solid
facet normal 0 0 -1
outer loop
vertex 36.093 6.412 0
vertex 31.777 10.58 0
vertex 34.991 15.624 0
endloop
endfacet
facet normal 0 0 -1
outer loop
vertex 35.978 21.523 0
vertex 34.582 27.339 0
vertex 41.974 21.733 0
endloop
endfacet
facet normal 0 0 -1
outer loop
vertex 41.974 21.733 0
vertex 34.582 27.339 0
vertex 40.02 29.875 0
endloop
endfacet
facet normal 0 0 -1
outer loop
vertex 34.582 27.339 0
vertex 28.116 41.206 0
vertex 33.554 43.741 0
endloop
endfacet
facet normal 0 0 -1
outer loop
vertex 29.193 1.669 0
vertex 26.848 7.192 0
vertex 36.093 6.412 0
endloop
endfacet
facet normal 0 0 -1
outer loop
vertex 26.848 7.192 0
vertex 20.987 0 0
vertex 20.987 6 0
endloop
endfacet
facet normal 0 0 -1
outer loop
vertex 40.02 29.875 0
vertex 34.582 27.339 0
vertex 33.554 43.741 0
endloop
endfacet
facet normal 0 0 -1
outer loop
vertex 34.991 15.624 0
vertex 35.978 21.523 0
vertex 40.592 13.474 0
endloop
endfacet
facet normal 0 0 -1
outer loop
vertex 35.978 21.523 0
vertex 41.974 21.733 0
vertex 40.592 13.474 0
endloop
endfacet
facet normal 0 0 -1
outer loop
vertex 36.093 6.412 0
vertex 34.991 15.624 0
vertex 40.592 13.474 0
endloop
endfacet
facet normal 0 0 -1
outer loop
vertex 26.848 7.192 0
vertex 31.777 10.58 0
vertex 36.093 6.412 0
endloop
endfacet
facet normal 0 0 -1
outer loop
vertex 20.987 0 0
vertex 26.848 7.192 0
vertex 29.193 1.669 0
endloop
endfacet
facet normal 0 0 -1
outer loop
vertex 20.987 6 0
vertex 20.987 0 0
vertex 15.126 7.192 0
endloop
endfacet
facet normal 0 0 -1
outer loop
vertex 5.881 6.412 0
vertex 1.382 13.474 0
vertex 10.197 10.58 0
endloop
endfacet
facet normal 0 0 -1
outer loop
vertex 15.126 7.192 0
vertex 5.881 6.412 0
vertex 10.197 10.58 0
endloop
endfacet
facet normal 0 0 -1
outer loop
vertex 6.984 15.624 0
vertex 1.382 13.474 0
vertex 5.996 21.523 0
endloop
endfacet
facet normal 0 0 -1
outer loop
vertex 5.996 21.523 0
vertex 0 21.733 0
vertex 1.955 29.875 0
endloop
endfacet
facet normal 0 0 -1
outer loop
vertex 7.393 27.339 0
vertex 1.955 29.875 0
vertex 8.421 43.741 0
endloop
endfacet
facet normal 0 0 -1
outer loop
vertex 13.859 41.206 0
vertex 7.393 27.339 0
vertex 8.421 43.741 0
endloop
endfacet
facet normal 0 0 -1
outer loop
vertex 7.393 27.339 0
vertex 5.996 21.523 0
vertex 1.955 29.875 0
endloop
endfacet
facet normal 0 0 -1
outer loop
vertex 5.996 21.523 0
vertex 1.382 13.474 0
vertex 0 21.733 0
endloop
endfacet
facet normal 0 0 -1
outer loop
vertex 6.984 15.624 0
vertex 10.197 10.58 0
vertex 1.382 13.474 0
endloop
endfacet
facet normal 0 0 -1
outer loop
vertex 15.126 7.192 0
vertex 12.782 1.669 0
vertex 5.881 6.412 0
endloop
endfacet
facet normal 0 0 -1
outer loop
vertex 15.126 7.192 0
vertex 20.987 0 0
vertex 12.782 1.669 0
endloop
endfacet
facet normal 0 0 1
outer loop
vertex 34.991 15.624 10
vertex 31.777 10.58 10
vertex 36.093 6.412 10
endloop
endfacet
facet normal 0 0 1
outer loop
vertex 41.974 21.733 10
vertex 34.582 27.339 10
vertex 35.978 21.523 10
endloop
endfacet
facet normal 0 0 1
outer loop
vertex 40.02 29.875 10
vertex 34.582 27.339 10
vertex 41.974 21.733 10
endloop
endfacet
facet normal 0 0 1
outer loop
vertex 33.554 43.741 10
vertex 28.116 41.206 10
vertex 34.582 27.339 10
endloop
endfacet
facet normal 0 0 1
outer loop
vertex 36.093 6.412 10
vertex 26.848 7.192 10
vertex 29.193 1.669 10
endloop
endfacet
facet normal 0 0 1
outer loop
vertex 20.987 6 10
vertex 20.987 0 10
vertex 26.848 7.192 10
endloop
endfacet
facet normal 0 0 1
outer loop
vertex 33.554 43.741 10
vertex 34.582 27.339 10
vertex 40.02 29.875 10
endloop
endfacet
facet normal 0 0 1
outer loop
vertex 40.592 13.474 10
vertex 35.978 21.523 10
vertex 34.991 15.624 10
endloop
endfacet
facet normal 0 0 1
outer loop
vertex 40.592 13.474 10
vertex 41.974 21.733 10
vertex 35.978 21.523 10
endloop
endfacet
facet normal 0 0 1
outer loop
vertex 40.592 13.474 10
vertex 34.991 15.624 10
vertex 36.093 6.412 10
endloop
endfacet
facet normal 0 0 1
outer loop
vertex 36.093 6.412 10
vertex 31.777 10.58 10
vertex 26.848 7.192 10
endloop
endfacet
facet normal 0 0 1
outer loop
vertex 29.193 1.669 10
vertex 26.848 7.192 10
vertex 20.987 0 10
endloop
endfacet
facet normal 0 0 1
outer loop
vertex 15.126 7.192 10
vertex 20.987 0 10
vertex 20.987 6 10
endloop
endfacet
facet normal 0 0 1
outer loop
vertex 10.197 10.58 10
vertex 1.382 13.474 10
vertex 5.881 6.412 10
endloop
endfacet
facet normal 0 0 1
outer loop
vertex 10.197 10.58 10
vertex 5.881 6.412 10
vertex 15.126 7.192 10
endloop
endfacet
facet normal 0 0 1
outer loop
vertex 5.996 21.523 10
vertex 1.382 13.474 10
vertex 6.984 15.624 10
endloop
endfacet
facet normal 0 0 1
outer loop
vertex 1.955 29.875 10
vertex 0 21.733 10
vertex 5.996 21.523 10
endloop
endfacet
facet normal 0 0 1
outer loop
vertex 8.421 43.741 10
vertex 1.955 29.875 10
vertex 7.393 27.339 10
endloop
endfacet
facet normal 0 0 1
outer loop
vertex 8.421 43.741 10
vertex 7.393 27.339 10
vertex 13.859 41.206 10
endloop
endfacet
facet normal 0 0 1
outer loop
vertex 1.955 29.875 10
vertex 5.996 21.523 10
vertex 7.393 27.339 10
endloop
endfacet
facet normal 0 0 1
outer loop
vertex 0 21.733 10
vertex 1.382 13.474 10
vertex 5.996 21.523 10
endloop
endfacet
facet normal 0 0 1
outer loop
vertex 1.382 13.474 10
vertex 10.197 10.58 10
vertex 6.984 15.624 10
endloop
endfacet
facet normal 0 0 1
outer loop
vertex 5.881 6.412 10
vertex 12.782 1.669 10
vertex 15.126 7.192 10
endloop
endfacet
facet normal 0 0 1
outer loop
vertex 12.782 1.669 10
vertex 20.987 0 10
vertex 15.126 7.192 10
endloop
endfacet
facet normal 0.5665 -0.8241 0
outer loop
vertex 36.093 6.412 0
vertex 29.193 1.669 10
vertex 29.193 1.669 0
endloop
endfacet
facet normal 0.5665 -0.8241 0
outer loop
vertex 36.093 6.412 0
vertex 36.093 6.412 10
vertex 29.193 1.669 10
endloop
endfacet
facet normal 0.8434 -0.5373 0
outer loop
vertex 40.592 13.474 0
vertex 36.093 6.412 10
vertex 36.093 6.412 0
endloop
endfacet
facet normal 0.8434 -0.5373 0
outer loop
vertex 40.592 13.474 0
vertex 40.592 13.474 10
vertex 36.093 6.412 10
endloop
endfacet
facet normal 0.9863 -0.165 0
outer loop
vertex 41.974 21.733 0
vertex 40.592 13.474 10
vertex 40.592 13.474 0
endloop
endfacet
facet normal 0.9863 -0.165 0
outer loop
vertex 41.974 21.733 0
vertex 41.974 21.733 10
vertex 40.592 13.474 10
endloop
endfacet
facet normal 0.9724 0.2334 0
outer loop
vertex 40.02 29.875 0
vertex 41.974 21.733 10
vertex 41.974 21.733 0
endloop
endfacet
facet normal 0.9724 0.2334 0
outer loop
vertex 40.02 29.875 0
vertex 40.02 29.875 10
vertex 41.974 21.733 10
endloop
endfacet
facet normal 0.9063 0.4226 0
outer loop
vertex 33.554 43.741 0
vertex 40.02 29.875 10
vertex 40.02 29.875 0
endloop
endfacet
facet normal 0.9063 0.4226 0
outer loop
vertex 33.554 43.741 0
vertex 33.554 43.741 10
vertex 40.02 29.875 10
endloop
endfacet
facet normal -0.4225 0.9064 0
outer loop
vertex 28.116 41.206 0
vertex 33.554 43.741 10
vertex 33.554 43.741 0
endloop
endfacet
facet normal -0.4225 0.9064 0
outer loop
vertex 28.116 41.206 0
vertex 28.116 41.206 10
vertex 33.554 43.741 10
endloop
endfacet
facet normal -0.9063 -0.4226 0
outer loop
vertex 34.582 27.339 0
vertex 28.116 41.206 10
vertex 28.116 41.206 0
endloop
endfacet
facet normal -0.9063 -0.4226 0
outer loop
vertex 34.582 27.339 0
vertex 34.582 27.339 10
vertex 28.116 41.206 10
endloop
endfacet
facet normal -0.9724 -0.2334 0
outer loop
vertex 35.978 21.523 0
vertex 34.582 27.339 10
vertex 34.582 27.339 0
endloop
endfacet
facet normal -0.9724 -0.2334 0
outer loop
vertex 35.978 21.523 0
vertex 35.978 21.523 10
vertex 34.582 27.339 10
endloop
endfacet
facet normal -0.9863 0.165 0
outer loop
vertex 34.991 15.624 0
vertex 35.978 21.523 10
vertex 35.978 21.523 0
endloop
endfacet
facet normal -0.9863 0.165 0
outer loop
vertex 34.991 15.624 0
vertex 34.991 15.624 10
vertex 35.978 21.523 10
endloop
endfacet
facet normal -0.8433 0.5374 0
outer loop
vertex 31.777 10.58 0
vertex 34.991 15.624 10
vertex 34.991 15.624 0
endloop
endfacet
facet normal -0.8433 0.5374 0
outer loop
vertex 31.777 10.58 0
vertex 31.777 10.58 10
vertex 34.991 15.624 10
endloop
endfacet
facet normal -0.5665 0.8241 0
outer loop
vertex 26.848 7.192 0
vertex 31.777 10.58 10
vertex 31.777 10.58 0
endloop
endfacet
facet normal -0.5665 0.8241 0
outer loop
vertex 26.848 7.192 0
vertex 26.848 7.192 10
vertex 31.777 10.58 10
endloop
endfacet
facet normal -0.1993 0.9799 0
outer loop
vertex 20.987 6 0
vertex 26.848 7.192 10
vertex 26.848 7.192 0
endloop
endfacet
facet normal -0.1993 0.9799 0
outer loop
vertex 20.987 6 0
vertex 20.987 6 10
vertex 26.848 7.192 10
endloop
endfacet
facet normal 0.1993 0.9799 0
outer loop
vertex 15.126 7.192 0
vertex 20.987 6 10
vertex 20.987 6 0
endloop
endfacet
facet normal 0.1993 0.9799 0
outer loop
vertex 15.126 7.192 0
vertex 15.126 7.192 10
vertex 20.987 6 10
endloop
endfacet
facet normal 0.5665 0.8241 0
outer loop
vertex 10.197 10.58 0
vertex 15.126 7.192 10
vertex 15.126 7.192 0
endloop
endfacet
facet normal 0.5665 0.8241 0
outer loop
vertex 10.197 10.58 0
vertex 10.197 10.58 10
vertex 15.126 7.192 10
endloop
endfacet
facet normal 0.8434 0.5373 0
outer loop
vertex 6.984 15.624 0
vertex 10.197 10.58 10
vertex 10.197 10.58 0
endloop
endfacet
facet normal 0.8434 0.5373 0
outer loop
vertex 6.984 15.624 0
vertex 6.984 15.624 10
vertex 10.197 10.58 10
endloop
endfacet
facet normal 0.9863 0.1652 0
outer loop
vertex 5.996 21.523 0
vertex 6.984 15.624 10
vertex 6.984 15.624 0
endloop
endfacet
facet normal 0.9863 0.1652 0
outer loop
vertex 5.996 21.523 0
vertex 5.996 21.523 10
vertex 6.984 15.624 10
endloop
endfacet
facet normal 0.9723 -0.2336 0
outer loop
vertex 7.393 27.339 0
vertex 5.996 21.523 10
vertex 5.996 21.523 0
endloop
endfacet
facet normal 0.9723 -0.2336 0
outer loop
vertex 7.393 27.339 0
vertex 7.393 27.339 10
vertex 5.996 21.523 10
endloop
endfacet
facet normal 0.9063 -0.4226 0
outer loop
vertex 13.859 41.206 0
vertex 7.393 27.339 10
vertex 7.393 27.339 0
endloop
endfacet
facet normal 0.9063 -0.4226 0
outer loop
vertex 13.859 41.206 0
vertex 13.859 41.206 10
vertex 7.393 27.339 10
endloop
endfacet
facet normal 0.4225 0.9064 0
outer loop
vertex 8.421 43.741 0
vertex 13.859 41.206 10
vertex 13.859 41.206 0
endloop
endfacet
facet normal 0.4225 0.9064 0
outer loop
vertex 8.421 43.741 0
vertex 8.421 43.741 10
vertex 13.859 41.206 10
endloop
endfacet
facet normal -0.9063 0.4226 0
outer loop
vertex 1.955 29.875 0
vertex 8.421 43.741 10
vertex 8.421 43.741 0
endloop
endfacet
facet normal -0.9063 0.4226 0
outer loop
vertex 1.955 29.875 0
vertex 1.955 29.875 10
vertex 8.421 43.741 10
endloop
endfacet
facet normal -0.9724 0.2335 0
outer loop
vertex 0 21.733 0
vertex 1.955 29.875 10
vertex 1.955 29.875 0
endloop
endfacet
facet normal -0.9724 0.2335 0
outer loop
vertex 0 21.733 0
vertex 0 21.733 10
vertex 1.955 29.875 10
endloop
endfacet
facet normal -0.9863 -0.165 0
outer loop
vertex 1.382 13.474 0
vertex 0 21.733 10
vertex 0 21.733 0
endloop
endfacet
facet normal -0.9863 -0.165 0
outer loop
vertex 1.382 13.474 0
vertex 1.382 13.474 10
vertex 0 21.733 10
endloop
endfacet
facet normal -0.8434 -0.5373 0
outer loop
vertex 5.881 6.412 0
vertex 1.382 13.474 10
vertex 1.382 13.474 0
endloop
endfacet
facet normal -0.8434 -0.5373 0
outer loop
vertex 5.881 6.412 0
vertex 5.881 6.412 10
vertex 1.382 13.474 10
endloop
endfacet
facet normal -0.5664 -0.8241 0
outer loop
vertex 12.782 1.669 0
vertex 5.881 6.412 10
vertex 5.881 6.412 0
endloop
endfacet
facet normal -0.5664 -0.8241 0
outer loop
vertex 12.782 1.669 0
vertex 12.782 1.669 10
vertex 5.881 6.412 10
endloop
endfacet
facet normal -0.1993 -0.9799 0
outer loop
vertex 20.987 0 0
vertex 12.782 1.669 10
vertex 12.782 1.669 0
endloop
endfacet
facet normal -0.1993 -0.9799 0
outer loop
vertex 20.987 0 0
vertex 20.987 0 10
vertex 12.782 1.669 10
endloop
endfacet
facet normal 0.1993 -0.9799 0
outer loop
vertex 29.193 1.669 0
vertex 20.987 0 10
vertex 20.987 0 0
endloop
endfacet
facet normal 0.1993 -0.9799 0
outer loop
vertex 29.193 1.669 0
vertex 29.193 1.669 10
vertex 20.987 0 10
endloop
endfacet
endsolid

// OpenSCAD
$fn = 32;

// ----------------------------------------------------------------------
// Clip blank: omega clip, 10 mm thick
// ----------------------------------------------------------------------

// --- parameters (mm) ---
profile_height = 10;      // extrusion height
profile_points = 26;      // points of the closed outline

profile = [[1.955, 29.875], [0, 21.733], [1.382, 13.474], [5.881, 6.412], [12.782, 1.669], [20.987, 0], [29.193, 1.669], [36.093, 6.412], [40.592, 13.474], [41.974, 21.733], [40.02, 29.875], [33.554, 43.741], [28.116, 41.206], [34.582, 27.339], [35.978, 21.523], [34.991, 15.624], [31.777, 10.58], [26.848, 7.192], [20.987, 6], [15.126, 7.192], [10.197, 10.58], [6.984, 15.624], [5.996, 21.523], [7.393, 27.339], [13.859, 41.206], [8.421, 43.741]];  // single closed polygon, 26 points, counter clockwise

// --- the one profile operation ---
linear_extrude(height = profile_height) polygon(points = profile);
